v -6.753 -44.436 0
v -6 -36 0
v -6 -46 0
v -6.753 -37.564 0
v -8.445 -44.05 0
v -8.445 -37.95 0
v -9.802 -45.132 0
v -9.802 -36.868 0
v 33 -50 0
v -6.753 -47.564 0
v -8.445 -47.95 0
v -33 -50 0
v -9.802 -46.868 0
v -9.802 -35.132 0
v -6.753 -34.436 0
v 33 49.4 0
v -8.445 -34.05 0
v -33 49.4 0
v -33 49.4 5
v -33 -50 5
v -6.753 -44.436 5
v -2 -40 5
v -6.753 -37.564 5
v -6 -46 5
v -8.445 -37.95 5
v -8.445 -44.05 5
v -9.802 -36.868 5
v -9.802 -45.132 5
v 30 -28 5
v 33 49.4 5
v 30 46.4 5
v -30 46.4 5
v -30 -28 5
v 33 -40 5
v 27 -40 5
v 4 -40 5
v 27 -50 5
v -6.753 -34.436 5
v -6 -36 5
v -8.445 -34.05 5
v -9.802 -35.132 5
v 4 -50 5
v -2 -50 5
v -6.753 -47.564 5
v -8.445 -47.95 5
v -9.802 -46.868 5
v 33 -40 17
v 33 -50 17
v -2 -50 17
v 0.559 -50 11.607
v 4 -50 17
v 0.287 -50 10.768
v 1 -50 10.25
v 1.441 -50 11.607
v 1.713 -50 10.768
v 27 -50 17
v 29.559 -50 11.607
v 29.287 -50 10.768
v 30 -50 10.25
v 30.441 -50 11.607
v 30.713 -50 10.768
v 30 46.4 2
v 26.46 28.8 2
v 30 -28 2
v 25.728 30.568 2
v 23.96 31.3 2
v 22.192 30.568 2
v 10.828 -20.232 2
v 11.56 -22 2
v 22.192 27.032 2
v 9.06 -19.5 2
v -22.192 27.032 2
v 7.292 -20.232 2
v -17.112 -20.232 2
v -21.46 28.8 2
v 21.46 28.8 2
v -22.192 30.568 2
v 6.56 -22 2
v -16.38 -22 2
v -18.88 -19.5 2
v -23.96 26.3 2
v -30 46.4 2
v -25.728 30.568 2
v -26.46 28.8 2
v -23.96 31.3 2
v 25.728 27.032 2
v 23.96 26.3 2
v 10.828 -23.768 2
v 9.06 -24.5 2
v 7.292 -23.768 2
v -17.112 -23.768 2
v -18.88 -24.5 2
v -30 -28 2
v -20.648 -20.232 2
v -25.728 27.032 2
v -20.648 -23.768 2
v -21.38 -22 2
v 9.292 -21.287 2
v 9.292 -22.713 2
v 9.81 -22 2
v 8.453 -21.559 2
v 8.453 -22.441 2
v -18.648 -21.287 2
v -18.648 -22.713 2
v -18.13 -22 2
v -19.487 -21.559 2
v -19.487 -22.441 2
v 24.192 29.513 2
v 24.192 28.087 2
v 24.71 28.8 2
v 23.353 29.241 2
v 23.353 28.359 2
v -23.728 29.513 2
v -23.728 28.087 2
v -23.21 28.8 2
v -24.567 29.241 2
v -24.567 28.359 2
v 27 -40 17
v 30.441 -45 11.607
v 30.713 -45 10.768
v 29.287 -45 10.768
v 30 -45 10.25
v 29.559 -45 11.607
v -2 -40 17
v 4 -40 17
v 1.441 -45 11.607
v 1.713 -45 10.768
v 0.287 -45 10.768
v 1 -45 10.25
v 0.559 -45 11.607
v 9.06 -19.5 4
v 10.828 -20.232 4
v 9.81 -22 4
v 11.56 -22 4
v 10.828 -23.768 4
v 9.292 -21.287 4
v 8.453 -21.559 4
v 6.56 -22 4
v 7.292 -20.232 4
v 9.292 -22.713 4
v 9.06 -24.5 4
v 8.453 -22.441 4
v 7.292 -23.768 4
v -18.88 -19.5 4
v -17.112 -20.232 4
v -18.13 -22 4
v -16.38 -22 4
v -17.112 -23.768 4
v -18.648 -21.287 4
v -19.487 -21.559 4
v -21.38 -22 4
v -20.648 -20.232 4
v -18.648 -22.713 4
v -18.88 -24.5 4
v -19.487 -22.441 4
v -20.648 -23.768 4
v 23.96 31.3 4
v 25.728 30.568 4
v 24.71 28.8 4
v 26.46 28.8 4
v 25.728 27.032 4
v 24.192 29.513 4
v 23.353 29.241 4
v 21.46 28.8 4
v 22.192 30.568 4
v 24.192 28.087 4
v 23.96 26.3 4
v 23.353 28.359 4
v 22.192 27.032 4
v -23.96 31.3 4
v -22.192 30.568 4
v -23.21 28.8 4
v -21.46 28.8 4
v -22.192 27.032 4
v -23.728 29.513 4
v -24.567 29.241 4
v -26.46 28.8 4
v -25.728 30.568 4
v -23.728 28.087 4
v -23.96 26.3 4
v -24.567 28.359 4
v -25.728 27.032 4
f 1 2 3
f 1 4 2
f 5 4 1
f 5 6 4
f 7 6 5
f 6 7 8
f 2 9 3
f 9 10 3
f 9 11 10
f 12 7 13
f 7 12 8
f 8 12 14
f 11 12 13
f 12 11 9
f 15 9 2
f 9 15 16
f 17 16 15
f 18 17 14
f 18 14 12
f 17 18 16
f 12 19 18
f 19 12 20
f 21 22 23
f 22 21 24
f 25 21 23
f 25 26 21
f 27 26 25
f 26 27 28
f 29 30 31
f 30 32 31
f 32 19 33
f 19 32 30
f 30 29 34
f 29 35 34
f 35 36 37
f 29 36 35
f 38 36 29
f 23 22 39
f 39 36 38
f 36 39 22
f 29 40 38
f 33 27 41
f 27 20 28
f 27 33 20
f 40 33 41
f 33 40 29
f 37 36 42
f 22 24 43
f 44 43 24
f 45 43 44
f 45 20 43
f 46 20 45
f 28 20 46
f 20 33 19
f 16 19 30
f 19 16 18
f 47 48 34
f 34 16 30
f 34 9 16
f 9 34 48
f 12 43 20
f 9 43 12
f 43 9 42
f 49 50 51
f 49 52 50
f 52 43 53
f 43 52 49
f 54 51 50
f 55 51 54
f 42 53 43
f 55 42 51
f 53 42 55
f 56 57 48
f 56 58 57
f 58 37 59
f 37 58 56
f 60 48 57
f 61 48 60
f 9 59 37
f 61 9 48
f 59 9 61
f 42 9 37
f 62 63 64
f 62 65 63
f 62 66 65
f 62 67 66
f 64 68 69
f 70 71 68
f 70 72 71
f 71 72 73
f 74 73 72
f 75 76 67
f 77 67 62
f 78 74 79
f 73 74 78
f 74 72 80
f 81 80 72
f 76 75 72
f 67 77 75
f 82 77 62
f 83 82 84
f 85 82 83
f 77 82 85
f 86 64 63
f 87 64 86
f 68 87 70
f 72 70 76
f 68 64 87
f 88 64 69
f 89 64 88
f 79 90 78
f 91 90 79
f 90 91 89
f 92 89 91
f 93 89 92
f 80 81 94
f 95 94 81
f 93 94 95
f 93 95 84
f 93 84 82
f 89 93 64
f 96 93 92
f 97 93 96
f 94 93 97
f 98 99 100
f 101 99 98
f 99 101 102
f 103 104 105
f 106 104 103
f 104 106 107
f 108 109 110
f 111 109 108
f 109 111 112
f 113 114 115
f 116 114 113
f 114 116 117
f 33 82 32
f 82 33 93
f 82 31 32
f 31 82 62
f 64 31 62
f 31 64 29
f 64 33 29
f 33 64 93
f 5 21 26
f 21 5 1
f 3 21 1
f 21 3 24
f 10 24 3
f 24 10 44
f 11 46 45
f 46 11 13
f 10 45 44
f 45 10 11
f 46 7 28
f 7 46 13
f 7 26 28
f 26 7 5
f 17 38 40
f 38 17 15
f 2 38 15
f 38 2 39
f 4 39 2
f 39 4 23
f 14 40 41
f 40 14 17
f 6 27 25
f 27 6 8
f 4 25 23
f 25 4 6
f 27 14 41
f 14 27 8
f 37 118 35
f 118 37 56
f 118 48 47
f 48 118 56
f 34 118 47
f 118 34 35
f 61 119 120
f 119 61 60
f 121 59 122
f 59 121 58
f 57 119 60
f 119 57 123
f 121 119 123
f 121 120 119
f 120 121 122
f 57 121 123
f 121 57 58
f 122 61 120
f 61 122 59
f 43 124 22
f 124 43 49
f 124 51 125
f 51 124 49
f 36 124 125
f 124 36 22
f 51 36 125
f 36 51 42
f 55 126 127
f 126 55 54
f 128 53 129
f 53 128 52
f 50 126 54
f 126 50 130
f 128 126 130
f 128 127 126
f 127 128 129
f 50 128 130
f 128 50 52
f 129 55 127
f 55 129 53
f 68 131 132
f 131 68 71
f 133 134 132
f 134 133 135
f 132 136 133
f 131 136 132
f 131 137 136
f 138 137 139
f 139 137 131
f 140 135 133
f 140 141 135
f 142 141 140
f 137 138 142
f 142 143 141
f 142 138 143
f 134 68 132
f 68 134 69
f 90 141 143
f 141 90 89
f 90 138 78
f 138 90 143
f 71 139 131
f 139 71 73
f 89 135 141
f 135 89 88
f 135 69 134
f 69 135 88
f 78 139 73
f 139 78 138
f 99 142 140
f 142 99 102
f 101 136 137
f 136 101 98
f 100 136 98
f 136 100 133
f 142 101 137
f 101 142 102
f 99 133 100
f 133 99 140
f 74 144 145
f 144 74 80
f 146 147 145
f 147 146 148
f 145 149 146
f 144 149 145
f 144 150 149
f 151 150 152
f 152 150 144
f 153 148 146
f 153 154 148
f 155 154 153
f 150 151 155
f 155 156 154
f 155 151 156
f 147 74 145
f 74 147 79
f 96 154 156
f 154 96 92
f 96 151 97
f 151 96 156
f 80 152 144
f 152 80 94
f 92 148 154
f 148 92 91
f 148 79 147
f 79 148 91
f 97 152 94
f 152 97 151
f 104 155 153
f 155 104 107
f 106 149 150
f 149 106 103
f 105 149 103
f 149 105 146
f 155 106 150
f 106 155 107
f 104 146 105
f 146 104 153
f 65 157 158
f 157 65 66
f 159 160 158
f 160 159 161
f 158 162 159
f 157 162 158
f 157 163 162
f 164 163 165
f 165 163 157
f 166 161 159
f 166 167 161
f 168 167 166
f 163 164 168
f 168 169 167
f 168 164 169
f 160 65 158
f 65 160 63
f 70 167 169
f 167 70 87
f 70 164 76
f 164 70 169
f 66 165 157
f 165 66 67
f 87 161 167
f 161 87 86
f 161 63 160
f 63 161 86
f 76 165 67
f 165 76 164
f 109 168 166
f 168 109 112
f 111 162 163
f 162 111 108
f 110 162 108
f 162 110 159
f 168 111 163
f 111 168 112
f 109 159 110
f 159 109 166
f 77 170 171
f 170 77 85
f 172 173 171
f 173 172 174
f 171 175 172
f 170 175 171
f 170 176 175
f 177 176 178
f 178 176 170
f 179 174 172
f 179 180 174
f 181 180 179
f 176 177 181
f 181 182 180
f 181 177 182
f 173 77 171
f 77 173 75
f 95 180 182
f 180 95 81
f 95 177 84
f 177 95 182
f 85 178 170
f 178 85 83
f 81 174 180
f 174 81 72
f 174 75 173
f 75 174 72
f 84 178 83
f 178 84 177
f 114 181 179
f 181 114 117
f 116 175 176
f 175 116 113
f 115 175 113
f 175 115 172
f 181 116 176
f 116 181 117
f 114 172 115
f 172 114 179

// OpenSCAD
color("red")
        translate([-33, -50, 0])
        union() {
            translate([0, 0, 0])
            base();
            
            translate([60, 0, 5])
            coso();
            translate([31, 0, 5])
            coso();
            
            translate([42.06, 28, 2])
            base_tornillos();
            translate([14.12, 28, 2])
            base_tornillos();
            translate([56.96, 78.8, 2])
            base_tornillos();
            translate([9.04, 78.8, 2])
            base_tornillos();
        }

module base()
        {
            difference() {
                linear_extrude(height = 5)
                square([66, 99.4]);
                translate([3, 22, 2])
                linear_extrude(height = 5)
                square([60, 74.4]);
                translate([25, 4, 0])
                cylinder(d=4, h=5);
                translate([25, 14, 0])
                cylinder(d=4, h=5);
            }
        }

module coso()
        {
            difference() {
                linear_extrude(height = 12)
                square([6, 10]);
                translate([3, 0, 6])
                rotate([270, 90, 0]) cylinder(d=1.5, h=5);
            }
        }

module base_tornillos()
        {
            difference() {
                linear_extrude(height = 2)
                circle(2.5);
                cylinder(d=1.5, h=2);
            }
        }
        
